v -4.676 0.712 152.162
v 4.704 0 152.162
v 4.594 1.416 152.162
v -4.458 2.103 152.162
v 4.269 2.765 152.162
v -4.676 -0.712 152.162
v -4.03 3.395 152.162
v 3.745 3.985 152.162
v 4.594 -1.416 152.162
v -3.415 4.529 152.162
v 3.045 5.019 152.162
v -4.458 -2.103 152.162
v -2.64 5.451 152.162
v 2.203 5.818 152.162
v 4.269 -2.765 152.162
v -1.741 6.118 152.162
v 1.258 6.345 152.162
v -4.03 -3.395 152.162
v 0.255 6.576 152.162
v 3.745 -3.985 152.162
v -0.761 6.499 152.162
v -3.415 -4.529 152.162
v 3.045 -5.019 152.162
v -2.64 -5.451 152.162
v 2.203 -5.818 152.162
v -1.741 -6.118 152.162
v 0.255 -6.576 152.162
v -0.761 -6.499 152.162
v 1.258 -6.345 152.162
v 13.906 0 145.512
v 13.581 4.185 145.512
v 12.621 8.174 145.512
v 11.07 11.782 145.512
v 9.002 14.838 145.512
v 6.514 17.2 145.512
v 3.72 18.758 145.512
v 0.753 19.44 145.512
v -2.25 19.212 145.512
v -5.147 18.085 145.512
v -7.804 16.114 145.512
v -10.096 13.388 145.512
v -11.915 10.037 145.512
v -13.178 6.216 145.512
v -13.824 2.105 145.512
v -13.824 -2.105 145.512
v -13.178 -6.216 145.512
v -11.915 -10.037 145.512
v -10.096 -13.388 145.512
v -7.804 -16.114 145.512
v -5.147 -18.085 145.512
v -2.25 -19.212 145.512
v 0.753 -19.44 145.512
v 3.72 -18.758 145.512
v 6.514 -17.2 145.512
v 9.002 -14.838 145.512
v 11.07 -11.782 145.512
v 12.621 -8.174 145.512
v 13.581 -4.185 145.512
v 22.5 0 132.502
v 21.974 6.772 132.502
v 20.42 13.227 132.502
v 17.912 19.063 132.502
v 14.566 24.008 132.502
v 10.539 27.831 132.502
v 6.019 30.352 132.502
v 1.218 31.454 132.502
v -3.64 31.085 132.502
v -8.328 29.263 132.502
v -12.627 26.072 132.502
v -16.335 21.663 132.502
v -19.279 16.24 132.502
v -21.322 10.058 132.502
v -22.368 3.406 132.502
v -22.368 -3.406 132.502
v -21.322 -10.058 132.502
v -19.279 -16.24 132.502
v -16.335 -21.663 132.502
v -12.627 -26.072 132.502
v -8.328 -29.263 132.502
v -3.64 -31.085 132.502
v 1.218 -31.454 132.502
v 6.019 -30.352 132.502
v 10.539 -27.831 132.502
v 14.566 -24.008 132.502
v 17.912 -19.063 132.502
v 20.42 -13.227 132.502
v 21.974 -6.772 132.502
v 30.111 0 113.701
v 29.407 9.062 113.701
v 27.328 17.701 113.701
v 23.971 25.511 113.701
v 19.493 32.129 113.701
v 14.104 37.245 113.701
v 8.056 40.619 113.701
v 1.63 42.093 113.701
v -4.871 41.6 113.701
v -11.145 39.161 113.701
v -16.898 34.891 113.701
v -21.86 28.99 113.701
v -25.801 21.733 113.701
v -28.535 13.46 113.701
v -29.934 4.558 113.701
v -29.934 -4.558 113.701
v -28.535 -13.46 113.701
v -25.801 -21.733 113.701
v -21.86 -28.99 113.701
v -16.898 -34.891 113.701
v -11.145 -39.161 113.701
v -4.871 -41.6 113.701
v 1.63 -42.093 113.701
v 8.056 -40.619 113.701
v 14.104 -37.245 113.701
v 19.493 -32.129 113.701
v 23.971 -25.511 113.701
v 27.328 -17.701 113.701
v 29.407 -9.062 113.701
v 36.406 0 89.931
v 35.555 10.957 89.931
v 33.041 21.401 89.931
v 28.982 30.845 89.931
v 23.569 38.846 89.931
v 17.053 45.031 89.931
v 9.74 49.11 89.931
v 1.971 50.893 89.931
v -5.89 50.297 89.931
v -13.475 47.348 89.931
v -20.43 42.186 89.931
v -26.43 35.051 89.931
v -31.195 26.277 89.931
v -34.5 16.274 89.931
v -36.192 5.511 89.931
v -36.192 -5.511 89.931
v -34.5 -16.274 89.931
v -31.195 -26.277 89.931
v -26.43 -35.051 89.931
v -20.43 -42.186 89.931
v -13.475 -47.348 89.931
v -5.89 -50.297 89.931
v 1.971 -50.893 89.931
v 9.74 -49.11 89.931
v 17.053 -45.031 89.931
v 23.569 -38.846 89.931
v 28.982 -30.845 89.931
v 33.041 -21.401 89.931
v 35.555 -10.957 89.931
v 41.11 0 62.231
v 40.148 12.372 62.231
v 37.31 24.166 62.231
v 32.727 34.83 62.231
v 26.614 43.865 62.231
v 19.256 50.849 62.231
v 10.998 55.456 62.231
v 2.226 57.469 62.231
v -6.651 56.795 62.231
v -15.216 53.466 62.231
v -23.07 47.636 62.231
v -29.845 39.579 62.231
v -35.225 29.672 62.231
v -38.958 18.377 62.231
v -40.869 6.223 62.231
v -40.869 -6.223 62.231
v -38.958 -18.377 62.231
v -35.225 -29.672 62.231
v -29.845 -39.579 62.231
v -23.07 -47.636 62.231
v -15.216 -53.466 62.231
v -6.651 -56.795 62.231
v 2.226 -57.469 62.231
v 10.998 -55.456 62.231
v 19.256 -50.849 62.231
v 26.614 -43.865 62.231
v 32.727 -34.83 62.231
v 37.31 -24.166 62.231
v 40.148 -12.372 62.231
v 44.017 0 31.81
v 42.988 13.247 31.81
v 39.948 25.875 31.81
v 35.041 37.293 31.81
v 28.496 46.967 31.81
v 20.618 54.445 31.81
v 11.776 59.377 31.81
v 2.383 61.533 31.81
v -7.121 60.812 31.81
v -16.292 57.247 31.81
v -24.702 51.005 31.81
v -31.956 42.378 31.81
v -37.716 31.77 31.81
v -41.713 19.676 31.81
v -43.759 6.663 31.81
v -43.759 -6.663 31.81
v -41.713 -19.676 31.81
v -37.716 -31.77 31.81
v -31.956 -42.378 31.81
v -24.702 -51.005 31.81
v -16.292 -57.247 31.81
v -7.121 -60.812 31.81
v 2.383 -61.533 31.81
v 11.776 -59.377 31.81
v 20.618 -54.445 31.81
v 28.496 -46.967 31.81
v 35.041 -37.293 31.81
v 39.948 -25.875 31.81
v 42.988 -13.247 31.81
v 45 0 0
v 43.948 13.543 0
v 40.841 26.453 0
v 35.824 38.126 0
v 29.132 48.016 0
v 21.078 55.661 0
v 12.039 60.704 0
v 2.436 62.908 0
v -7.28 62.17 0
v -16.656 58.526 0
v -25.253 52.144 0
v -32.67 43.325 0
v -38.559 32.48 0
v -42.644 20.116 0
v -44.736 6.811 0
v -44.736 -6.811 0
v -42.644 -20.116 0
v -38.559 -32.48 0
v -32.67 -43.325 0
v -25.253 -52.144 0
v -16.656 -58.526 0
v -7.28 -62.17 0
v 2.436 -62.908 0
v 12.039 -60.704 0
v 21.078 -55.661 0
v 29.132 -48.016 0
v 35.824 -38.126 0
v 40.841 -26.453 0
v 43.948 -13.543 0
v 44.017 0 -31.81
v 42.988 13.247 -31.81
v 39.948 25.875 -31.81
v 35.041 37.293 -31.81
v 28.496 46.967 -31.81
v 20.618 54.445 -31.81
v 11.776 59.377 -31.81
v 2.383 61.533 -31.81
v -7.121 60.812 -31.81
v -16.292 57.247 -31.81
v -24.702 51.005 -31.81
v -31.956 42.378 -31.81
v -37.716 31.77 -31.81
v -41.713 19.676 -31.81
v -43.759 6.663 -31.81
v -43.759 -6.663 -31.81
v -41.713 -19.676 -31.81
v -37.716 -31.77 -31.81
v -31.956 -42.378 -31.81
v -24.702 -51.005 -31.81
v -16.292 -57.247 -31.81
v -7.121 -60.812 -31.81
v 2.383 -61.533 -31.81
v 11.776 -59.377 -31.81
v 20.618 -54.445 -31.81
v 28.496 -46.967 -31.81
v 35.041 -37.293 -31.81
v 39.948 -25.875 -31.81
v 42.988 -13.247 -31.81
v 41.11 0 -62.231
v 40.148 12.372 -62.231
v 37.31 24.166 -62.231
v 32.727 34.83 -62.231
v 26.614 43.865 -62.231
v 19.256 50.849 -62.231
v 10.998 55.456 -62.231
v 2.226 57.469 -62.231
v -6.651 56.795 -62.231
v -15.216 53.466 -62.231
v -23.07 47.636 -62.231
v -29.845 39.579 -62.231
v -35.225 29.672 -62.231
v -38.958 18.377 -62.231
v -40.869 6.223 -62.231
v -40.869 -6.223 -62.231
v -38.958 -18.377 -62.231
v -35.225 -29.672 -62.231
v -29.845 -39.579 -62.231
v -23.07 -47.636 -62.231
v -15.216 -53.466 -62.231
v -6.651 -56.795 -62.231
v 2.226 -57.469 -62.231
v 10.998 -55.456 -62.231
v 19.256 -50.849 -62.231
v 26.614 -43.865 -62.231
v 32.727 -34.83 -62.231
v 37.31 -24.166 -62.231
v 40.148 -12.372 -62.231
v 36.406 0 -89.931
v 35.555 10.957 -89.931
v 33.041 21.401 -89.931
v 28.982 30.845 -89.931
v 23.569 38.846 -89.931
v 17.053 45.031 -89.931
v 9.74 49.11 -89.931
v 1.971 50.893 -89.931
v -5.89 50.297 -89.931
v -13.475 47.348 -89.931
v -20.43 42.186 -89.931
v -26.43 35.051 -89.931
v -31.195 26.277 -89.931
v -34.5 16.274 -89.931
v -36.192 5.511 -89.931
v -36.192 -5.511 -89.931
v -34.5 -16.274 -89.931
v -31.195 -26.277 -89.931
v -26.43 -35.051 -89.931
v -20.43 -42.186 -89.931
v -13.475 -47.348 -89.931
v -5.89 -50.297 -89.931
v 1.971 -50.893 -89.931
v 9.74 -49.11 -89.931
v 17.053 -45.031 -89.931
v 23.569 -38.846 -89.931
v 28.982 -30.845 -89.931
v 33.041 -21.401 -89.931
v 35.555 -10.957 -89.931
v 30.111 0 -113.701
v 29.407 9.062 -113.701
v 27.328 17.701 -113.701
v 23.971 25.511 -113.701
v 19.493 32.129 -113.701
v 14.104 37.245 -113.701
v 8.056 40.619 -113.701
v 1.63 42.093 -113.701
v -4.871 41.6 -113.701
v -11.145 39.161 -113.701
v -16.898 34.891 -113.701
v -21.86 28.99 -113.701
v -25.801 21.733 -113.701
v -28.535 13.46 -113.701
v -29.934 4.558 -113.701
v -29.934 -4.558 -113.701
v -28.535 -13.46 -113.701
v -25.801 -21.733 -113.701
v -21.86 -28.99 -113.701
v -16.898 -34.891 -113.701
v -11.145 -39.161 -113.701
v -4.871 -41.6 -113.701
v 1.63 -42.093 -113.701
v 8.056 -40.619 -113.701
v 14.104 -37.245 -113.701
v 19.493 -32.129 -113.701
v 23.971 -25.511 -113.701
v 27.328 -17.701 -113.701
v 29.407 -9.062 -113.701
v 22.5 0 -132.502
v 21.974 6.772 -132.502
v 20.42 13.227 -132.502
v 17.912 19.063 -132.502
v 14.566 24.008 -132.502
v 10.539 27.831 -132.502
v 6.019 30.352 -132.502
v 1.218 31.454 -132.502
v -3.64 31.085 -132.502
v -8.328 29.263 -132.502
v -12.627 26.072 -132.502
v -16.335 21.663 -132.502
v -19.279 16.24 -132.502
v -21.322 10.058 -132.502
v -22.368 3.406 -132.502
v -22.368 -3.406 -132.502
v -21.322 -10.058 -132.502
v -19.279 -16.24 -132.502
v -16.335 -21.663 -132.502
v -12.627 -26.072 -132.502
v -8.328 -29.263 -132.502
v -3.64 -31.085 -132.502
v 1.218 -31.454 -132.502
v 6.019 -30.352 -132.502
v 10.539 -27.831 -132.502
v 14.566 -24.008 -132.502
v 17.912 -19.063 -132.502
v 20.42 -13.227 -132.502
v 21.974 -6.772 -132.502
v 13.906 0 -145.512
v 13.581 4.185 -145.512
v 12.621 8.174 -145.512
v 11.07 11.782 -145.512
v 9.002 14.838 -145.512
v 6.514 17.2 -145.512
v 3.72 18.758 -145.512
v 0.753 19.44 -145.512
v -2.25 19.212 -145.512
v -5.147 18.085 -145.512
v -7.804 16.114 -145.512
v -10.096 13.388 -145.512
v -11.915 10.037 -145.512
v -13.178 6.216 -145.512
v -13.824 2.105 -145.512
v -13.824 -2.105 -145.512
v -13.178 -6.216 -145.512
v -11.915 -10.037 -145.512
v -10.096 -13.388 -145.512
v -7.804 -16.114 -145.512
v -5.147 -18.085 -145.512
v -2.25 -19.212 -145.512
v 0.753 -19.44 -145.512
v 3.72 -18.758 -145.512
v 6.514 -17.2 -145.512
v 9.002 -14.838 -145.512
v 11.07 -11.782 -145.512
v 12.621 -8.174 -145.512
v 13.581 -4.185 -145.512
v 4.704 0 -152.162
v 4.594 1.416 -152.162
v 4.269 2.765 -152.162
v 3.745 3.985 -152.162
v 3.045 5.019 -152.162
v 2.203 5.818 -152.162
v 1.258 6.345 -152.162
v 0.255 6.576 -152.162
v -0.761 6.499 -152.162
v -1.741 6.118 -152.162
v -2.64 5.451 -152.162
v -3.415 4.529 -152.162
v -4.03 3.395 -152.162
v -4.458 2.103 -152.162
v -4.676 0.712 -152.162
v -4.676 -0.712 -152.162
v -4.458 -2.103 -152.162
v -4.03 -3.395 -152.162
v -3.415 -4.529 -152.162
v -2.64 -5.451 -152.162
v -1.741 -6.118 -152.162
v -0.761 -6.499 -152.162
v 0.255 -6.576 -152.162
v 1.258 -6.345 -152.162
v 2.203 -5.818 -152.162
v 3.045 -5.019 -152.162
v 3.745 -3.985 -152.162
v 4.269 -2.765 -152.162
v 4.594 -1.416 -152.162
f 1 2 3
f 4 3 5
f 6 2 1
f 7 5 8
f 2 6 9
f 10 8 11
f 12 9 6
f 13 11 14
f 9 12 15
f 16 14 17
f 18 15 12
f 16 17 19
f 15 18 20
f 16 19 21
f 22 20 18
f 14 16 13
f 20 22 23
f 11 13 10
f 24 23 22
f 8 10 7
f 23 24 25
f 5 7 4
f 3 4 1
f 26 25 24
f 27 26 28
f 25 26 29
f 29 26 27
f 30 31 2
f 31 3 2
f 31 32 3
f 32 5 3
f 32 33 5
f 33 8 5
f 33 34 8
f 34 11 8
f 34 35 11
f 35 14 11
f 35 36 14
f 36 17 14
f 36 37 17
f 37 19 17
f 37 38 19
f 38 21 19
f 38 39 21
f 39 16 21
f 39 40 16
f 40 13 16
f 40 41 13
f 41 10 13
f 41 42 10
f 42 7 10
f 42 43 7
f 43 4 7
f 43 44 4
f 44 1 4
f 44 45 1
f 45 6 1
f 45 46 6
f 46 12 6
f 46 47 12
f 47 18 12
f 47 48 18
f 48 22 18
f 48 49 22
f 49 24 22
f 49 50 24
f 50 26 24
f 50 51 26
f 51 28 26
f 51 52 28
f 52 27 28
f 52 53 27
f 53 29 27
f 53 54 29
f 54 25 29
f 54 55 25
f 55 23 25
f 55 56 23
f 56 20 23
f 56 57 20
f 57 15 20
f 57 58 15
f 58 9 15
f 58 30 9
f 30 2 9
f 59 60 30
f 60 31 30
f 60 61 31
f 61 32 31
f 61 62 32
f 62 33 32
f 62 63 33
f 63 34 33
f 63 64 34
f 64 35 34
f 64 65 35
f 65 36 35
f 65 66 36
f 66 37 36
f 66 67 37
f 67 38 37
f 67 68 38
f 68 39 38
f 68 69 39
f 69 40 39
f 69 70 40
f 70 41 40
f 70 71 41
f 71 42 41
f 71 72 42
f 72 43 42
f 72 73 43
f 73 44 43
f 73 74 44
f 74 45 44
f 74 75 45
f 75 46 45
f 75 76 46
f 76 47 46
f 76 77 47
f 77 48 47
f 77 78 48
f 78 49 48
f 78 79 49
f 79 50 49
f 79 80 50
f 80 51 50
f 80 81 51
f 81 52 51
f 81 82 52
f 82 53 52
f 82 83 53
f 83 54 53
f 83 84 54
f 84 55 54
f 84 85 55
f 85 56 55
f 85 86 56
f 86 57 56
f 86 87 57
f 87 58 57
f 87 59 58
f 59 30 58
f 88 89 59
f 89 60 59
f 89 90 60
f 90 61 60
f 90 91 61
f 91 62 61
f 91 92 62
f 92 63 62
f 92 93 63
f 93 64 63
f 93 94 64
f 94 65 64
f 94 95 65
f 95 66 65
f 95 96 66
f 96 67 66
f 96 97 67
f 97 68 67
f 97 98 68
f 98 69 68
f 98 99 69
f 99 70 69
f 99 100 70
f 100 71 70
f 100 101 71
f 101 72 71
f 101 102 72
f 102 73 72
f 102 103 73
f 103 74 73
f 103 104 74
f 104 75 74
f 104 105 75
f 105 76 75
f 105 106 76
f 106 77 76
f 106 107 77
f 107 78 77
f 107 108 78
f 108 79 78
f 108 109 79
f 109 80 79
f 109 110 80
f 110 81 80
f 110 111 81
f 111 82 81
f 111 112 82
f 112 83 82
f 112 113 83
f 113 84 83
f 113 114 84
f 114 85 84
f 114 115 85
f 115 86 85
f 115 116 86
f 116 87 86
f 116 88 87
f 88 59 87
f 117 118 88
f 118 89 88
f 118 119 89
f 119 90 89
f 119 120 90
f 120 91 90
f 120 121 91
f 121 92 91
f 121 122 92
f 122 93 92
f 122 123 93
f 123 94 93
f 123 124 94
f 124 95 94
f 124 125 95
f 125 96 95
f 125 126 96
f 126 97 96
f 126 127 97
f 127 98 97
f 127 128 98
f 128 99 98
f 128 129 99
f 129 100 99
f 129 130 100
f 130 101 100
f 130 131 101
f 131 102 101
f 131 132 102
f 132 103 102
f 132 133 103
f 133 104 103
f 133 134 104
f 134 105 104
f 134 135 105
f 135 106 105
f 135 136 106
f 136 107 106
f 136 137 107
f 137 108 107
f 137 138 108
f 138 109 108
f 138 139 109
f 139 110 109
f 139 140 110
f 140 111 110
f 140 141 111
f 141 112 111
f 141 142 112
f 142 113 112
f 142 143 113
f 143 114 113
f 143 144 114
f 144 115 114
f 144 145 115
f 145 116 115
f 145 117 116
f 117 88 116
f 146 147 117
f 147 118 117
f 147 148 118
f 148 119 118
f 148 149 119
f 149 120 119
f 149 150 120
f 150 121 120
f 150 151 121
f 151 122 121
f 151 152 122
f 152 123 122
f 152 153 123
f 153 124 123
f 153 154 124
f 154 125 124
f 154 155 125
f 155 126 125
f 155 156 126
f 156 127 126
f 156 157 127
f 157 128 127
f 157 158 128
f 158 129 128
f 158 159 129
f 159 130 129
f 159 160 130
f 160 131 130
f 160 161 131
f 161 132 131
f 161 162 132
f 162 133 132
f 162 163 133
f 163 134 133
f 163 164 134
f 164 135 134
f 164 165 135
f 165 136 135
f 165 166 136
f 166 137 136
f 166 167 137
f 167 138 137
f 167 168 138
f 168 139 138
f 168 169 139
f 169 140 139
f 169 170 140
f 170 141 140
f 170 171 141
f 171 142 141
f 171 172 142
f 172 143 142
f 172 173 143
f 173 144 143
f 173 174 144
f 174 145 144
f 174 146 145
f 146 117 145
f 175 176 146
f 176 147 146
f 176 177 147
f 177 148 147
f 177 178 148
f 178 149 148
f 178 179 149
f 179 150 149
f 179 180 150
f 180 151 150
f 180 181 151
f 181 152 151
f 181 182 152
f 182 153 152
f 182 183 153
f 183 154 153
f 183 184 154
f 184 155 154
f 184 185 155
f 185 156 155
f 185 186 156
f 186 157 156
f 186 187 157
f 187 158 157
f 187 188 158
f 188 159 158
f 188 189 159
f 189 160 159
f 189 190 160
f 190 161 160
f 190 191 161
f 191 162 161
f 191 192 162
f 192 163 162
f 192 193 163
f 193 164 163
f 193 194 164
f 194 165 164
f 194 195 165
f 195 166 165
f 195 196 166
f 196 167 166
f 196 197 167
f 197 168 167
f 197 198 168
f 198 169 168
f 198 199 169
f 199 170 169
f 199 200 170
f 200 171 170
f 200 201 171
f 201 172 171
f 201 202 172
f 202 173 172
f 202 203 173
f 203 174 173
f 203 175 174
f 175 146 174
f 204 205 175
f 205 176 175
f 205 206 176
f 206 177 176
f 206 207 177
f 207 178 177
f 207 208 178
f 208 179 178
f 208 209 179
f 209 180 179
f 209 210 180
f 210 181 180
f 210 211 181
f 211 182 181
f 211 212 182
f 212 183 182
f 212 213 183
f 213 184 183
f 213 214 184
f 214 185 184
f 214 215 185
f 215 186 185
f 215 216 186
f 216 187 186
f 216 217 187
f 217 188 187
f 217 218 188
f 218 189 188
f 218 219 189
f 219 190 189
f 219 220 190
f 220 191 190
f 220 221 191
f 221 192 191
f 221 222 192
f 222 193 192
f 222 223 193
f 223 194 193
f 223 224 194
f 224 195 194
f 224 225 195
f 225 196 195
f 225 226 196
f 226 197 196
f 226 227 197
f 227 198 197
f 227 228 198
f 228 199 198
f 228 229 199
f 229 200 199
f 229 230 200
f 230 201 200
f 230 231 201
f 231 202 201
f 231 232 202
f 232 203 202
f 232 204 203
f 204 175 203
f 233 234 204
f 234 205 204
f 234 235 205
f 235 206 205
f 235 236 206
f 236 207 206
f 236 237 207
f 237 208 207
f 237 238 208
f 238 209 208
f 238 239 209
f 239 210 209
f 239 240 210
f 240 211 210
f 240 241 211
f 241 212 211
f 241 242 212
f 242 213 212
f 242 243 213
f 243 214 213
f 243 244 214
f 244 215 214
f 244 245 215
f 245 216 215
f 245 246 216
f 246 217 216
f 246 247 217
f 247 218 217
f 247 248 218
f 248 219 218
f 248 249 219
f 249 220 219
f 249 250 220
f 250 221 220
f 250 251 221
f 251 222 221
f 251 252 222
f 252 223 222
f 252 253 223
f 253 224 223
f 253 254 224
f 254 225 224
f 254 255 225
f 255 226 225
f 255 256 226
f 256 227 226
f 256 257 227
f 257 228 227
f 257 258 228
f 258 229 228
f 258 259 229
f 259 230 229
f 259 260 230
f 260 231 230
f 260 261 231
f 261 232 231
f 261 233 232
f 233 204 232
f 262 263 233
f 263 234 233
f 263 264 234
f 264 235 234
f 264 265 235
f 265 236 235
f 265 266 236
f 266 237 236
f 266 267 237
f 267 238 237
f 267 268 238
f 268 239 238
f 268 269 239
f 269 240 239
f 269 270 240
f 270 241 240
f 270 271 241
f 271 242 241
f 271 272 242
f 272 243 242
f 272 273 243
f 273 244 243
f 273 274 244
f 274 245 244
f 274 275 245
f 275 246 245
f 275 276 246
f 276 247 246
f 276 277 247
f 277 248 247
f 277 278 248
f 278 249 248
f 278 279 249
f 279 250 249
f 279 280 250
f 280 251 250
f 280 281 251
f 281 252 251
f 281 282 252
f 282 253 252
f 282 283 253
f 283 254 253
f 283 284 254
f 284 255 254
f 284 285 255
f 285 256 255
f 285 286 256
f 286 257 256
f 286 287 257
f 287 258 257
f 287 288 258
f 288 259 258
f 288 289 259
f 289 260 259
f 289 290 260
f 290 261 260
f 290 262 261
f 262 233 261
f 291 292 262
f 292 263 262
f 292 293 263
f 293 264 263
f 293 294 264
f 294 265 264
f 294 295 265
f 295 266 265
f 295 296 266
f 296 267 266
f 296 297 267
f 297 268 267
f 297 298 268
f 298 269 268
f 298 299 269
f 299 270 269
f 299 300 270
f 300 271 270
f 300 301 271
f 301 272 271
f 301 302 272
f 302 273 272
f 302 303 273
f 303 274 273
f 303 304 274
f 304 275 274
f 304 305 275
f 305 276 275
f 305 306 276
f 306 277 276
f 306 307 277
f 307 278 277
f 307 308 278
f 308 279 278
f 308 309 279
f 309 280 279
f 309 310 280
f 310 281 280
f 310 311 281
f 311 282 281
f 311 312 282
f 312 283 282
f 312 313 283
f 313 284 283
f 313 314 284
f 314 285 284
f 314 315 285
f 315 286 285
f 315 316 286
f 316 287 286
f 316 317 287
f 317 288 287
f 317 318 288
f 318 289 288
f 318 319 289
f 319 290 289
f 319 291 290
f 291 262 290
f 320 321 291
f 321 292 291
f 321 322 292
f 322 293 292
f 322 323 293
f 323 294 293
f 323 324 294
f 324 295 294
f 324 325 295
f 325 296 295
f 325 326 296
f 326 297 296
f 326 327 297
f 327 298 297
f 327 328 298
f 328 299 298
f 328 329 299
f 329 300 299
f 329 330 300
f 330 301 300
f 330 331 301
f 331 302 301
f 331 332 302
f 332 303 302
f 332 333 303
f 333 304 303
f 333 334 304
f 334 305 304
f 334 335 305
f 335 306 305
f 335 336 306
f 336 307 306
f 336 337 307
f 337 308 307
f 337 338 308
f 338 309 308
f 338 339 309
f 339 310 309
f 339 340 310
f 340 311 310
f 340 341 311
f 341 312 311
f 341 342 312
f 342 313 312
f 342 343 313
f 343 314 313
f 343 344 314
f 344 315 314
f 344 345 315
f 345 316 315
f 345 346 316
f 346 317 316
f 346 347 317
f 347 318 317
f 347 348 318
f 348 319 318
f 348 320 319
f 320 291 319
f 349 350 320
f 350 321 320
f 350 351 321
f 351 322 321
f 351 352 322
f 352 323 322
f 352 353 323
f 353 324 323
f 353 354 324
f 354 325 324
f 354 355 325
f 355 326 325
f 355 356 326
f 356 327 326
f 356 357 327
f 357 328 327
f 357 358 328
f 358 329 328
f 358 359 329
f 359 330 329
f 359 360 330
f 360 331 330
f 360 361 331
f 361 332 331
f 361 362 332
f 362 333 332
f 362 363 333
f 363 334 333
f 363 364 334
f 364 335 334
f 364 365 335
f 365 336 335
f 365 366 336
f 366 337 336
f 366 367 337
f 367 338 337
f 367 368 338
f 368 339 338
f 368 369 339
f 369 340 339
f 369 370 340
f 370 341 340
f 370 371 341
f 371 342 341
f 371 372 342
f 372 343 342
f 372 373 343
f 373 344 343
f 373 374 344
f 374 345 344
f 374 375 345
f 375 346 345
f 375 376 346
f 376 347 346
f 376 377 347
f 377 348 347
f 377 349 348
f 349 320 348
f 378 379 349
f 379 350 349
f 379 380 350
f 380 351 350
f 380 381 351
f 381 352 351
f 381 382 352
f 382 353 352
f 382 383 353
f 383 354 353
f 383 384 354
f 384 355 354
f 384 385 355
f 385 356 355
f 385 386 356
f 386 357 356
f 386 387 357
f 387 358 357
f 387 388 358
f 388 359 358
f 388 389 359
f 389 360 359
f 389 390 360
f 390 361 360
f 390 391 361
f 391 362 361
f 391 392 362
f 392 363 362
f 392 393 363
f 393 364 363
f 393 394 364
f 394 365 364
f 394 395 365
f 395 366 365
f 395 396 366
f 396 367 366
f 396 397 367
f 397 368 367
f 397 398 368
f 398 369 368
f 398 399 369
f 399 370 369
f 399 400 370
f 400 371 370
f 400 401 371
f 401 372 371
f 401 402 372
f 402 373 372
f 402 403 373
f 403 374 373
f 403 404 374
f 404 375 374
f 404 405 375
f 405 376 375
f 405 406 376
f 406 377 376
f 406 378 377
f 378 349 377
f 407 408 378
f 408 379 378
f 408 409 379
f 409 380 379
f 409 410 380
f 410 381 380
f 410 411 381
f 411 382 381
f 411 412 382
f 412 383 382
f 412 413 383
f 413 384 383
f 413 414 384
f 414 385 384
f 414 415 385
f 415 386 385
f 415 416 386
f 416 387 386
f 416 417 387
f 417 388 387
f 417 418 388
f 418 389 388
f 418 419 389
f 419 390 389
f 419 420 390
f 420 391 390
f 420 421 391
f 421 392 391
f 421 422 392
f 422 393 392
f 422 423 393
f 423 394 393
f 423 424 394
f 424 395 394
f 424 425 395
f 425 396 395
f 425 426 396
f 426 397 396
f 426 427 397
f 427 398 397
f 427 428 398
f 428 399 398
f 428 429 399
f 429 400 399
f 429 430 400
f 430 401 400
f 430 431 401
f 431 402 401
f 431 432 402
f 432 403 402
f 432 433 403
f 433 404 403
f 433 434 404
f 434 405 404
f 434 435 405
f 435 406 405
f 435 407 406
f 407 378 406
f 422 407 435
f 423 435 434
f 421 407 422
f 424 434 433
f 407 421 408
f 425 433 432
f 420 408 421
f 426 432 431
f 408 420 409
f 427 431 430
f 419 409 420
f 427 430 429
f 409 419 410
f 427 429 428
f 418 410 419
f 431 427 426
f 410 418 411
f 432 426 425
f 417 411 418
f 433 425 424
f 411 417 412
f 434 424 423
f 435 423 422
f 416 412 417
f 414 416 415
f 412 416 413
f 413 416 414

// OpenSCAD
// Generated by SolidPython 1.0.1 on 2020-07-29 00:46:46


scale(v = [5, 7, 17]) {
	sphere(r = 9);
}
/***********************************************
*********      SolidPython code:      **********
************************************************
 
# import packages: SolidPython
from solid import *
from solid.utils import *
from itertools import chain, combinations, permutations


class Resize:

    def __init__(self, scad_file):
        self.scad_file = scad_file
        #self.scad_file = import_scad(scad_file)
        # cone/cylinder param:
        self.r1 = 0
        self.r2 = 0
        self.h = 0
        # rectangular prism param:
        self.w = 0
        self.l = 0
        # ellipse param:
        self.r = 0

    # import OpenScad code (file name corresponds to shape)


    # classify shape + parameters
    def assign(self, param1, param2, param3):
        if self.scad_file == 'cone.scad':
            self.r1 = param1
            self.r2 = param2
            self.h = param3
        elif self.scad_file == 'cylinder.scad':
            self.r1 = param1
            self.r2 = param2
            self.h = param3
        elif self.scad_file == 'rectangularPrism.scad':
            self.h = param1
            self.l = param2
            self.w = param3
        else:
            self.r = param1
            self.h = param2

    # resize parameters
    def iterate(self):
        x = range(3, 20, 2)
        i = 1
        if self.scad_file == 'cone.scad':
            tempList = list(permutations(x, 2))
            for temp in tempList:
                param1 = temp[0]
                param2 = temp[1]
                filepath = 'produced_scad_files/' + 'cone' + str(param1) + '_' + str(param2) + '_' + '.scad'
                scad_render_to_file(cylinder(h=param1, r1=param2, r2=0), filepath)

        elif self.scad_file == 'cylinder.scad':
            tempList = list(permutations(x, 3))
            for temp in tempList:
                param1 = temp[0]
                param2 = temp[1]
                filepath = 'produced_scad_files/' + 'cylinder' + str(param1) + '_' + str(param2) + '_' + '.scad'
                scad_render_to_file(cylinder(h=param1, r1=param2, r2=param2), filepath)

        elif self.scad_file == 'rectangularPrism.scad':
            tempList = list(permutations(x, 3))
            for temp in tempList:
                param1 = temp[0]
                param2 = temp[1]
                param3 = temp[2]
                filepath = 'produced_scad_files/' + 'rectangularPrism' + str(param1) + '_' + str(param2) + '_' + str(
                    param3) + '.scad'
                scad_render_to_file(cube(size=(param1, param2, param3)), filepath)

        elif self.scad_file == 'ellipse.scad':
            tempList = list(permutations(x, 4))
            for temp in tempList:
                param1 = temp[0]
                param2 = temp[1]
                param3 = temp[2]
                param4 = temp[3]
                filepath = 'produced_scad_files/' + 'ellipse' + str(param1) + '_' + str(param2) + '_' + str(param3) + '_' + str(param4) + '.scad'
                scad_render_to_file(scale([param1, param2, param3])(sphere(r=param4)), filepath)

    def render_to_scadfile(self):
        scad_render_to_file(scad, 'example.scad') 
 
************************************************/
